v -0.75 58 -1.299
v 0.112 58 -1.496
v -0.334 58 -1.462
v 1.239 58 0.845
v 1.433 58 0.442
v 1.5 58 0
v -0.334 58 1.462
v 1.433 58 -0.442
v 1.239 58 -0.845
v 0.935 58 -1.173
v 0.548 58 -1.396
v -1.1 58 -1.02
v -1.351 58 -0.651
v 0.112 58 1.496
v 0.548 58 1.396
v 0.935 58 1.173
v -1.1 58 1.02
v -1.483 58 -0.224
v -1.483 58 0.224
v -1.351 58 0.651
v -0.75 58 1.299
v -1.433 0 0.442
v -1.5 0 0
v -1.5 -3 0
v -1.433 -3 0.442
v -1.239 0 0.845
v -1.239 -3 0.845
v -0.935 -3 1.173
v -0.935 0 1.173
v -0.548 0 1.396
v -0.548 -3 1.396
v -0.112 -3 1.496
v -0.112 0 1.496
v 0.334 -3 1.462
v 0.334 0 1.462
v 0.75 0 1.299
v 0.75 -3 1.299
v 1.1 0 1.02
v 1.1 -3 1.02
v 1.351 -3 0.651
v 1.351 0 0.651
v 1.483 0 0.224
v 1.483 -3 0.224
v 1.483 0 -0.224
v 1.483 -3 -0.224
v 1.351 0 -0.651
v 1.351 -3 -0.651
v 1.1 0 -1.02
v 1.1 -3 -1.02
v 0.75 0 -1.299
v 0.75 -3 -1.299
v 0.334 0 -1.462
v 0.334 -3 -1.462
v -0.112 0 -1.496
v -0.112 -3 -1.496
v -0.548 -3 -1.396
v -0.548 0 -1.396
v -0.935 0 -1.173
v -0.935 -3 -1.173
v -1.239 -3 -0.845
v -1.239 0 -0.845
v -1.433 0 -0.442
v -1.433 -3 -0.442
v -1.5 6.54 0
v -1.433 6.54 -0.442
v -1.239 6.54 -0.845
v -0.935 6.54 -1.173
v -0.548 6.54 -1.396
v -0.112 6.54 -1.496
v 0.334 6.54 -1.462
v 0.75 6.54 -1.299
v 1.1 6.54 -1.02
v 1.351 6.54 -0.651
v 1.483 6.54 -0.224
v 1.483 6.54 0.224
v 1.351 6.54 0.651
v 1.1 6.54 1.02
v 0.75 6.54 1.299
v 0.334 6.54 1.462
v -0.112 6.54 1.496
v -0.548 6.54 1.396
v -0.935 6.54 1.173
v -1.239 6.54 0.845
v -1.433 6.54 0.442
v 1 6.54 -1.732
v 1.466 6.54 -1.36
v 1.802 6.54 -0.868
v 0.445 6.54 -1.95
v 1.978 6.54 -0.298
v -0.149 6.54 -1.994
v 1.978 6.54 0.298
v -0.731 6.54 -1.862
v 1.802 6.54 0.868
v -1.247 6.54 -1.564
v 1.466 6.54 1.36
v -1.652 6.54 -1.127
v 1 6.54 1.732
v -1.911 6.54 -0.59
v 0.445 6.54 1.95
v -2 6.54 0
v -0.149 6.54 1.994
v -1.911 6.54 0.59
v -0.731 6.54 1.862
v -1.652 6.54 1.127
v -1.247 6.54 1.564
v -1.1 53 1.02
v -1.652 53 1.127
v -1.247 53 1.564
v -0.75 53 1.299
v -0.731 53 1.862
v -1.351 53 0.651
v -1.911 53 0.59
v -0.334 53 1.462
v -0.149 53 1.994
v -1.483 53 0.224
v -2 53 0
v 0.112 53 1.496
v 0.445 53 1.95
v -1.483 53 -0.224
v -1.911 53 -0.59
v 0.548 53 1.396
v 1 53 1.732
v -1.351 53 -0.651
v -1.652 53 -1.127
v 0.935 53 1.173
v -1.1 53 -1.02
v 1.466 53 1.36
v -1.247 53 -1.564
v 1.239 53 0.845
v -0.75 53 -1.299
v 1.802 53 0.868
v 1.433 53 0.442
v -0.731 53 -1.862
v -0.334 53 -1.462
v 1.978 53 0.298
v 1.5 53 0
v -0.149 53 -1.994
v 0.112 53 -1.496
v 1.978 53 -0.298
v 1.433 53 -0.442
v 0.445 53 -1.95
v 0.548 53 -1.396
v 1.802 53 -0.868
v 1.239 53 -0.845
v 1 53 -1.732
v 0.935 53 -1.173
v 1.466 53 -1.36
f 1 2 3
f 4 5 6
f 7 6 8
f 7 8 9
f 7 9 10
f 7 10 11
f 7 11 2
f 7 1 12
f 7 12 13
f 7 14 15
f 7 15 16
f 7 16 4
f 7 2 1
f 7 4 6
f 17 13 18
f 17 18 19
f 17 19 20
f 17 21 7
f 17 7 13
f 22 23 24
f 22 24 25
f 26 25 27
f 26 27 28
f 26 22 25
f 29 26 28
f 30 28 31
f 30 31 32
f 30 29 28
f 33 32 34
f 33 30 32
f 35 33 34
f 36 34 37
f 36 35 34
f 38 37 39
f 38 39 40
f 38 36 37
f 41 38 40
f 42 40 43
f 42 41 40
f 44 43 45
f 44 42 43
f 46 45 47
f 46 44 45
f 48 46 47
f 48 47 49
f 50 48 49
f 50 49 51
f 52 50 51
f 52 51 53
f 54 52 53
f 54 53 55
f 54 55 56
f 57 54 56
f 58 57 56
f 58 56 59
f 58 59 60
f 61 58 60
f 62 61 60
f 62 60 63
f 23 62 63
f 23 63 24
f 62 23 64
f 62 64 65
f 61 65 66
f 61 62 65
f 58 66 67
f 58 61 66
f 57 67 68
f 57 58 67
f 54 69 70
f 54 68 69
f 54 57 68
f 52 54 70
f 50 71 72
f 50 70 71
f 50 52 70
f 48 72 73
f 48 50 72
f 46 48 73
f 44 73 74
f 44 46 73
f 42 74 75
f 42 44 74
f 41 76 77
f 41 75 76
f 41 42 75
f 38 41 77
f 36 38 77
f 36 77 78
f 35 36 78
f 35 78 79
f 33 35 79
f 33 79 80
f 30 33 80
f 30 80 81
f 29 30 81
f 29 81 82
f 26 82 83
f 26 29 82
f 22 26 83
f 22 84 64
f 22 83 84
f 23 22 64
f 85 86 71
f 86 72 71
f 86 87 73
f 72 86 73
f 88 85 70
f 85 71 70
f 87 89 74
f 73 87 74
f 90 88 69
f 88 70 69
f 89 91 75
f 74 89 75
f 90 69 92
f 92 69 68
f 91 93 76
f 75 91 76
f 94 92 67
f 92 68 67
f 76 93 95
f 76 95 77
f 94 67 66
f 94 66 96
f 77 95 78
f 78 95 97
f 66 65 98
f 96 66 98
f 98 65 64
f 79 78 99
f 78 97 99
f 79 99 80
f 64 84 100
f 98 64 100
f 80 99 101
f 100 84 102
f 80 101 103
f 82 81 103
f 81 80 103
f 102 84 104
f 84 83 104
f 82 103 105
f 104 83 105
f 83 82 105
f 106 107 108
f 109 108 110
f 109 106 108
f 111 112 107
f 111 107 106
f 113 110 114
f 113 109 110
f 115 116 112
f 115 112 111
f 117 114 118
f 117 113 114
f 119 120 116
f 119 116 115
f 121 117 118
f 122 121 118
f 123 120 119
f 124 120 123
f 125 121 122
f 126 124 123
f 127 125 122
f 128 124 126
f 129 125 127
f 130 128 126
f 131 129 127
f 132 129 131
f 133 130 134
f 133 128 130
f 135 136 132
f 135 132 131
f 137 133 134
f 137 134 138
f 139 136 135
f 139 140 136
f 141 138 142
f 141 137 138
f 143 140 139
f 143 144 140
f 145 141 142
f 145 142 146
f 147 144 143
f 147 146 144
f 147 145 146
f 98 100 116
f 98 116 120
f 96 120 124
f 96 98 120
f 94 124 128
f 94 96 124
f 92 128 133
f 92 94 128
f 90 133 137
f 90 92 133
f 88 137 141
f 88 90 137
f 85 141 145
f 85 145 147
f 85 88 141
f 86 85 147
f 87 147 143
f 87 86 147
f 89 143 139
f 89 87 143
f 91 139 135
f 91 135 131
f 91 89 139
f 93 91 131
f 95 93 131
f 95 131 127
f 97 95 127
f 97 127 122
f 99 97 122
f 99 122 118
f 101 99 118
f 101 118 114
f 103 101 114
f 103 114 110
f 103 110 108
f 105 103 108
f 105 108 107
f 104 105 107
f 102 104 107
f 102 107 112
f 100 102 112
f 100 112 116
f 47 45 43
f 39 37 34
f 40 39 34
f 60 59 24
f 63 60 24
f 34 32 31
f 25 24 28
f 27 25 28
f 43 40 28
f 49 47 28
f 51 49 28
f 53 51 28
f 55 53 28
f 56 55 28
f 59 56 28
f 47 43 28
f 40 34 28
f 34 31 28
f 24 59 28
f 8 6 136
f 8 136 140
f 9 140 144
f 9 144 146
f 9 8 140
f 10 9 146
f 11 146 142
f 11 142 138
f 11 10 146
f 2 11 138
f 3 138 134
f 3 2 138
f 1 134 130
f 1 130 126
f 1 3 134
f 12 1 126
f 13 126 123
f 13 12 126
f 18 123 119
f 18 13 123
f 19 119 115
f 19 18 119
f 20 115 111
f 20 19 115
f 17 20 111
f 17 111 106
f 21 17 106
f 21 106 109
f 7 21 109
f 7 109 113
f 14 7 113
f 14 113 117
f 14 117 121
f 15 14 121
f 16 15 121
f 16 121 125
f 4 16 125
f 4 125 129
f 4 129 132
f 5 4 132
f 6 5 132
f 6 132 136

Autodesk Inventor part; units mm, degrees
ref_plane "YZ Plane" through (0, 0, 0) normal (1, 0, 0) x (0, 1, 0)
ref_plane "XZ Plane" through (0, 0, 0) normal (0, 1, 0) x (-1, 0, 0)
ref_plane "XY Plane" through (0, 0, 0) normal (0, 0, 1) x (1, 0, 0)
sketch "Sketch1" plane through (0, 0, 0) normal (0, 1, 0) x (-1, 0, 0)
  circle A0 centre (0, 0) radius 2
  dimension "d0" = 4
extrude "Extrusion1" add sketch "Sketch1" along normal blind 58 and the other way blind 3
sketch "Sketch2" plane through (0, 0, 0) normal (0, 1, 0) x (-1, 0, 0)
  circle A0 centre (0, 0) radius 1.5
  circle A1 centre (0, 0) radius 2
  dimension "d3" = 3
  dimension "d4" = 4
extrude "Extrusion2" cut sketch "Sketch2" along normal blind 6.54 and the other way blind 3
thread "Thread1" size "M4.5x0.75" class "6g" standard "ANSI Metric M Profile" full length
thread "Thread2" size "M4.5x0.75" class "6g" standard "ANSI Metric M Profile" full length
sketch "Sketch3" plane through (0, 58, 0) normal (0, 1, 0) x (1, 0, 0)
  circle A0 centre (0, 0) radius 1.5
  circle A1 centre (0, 0) radius 2
  dimension "d11" = 3
  dimension "d12" = 4
extrude "Extrusion3" cut sketch "Sketch3" against normal blind 5
thread "Thread3" size "M4.5x0.75" class "6g" standard "ANSI Metric M Profile" full length
properties part number "Rod Design"
